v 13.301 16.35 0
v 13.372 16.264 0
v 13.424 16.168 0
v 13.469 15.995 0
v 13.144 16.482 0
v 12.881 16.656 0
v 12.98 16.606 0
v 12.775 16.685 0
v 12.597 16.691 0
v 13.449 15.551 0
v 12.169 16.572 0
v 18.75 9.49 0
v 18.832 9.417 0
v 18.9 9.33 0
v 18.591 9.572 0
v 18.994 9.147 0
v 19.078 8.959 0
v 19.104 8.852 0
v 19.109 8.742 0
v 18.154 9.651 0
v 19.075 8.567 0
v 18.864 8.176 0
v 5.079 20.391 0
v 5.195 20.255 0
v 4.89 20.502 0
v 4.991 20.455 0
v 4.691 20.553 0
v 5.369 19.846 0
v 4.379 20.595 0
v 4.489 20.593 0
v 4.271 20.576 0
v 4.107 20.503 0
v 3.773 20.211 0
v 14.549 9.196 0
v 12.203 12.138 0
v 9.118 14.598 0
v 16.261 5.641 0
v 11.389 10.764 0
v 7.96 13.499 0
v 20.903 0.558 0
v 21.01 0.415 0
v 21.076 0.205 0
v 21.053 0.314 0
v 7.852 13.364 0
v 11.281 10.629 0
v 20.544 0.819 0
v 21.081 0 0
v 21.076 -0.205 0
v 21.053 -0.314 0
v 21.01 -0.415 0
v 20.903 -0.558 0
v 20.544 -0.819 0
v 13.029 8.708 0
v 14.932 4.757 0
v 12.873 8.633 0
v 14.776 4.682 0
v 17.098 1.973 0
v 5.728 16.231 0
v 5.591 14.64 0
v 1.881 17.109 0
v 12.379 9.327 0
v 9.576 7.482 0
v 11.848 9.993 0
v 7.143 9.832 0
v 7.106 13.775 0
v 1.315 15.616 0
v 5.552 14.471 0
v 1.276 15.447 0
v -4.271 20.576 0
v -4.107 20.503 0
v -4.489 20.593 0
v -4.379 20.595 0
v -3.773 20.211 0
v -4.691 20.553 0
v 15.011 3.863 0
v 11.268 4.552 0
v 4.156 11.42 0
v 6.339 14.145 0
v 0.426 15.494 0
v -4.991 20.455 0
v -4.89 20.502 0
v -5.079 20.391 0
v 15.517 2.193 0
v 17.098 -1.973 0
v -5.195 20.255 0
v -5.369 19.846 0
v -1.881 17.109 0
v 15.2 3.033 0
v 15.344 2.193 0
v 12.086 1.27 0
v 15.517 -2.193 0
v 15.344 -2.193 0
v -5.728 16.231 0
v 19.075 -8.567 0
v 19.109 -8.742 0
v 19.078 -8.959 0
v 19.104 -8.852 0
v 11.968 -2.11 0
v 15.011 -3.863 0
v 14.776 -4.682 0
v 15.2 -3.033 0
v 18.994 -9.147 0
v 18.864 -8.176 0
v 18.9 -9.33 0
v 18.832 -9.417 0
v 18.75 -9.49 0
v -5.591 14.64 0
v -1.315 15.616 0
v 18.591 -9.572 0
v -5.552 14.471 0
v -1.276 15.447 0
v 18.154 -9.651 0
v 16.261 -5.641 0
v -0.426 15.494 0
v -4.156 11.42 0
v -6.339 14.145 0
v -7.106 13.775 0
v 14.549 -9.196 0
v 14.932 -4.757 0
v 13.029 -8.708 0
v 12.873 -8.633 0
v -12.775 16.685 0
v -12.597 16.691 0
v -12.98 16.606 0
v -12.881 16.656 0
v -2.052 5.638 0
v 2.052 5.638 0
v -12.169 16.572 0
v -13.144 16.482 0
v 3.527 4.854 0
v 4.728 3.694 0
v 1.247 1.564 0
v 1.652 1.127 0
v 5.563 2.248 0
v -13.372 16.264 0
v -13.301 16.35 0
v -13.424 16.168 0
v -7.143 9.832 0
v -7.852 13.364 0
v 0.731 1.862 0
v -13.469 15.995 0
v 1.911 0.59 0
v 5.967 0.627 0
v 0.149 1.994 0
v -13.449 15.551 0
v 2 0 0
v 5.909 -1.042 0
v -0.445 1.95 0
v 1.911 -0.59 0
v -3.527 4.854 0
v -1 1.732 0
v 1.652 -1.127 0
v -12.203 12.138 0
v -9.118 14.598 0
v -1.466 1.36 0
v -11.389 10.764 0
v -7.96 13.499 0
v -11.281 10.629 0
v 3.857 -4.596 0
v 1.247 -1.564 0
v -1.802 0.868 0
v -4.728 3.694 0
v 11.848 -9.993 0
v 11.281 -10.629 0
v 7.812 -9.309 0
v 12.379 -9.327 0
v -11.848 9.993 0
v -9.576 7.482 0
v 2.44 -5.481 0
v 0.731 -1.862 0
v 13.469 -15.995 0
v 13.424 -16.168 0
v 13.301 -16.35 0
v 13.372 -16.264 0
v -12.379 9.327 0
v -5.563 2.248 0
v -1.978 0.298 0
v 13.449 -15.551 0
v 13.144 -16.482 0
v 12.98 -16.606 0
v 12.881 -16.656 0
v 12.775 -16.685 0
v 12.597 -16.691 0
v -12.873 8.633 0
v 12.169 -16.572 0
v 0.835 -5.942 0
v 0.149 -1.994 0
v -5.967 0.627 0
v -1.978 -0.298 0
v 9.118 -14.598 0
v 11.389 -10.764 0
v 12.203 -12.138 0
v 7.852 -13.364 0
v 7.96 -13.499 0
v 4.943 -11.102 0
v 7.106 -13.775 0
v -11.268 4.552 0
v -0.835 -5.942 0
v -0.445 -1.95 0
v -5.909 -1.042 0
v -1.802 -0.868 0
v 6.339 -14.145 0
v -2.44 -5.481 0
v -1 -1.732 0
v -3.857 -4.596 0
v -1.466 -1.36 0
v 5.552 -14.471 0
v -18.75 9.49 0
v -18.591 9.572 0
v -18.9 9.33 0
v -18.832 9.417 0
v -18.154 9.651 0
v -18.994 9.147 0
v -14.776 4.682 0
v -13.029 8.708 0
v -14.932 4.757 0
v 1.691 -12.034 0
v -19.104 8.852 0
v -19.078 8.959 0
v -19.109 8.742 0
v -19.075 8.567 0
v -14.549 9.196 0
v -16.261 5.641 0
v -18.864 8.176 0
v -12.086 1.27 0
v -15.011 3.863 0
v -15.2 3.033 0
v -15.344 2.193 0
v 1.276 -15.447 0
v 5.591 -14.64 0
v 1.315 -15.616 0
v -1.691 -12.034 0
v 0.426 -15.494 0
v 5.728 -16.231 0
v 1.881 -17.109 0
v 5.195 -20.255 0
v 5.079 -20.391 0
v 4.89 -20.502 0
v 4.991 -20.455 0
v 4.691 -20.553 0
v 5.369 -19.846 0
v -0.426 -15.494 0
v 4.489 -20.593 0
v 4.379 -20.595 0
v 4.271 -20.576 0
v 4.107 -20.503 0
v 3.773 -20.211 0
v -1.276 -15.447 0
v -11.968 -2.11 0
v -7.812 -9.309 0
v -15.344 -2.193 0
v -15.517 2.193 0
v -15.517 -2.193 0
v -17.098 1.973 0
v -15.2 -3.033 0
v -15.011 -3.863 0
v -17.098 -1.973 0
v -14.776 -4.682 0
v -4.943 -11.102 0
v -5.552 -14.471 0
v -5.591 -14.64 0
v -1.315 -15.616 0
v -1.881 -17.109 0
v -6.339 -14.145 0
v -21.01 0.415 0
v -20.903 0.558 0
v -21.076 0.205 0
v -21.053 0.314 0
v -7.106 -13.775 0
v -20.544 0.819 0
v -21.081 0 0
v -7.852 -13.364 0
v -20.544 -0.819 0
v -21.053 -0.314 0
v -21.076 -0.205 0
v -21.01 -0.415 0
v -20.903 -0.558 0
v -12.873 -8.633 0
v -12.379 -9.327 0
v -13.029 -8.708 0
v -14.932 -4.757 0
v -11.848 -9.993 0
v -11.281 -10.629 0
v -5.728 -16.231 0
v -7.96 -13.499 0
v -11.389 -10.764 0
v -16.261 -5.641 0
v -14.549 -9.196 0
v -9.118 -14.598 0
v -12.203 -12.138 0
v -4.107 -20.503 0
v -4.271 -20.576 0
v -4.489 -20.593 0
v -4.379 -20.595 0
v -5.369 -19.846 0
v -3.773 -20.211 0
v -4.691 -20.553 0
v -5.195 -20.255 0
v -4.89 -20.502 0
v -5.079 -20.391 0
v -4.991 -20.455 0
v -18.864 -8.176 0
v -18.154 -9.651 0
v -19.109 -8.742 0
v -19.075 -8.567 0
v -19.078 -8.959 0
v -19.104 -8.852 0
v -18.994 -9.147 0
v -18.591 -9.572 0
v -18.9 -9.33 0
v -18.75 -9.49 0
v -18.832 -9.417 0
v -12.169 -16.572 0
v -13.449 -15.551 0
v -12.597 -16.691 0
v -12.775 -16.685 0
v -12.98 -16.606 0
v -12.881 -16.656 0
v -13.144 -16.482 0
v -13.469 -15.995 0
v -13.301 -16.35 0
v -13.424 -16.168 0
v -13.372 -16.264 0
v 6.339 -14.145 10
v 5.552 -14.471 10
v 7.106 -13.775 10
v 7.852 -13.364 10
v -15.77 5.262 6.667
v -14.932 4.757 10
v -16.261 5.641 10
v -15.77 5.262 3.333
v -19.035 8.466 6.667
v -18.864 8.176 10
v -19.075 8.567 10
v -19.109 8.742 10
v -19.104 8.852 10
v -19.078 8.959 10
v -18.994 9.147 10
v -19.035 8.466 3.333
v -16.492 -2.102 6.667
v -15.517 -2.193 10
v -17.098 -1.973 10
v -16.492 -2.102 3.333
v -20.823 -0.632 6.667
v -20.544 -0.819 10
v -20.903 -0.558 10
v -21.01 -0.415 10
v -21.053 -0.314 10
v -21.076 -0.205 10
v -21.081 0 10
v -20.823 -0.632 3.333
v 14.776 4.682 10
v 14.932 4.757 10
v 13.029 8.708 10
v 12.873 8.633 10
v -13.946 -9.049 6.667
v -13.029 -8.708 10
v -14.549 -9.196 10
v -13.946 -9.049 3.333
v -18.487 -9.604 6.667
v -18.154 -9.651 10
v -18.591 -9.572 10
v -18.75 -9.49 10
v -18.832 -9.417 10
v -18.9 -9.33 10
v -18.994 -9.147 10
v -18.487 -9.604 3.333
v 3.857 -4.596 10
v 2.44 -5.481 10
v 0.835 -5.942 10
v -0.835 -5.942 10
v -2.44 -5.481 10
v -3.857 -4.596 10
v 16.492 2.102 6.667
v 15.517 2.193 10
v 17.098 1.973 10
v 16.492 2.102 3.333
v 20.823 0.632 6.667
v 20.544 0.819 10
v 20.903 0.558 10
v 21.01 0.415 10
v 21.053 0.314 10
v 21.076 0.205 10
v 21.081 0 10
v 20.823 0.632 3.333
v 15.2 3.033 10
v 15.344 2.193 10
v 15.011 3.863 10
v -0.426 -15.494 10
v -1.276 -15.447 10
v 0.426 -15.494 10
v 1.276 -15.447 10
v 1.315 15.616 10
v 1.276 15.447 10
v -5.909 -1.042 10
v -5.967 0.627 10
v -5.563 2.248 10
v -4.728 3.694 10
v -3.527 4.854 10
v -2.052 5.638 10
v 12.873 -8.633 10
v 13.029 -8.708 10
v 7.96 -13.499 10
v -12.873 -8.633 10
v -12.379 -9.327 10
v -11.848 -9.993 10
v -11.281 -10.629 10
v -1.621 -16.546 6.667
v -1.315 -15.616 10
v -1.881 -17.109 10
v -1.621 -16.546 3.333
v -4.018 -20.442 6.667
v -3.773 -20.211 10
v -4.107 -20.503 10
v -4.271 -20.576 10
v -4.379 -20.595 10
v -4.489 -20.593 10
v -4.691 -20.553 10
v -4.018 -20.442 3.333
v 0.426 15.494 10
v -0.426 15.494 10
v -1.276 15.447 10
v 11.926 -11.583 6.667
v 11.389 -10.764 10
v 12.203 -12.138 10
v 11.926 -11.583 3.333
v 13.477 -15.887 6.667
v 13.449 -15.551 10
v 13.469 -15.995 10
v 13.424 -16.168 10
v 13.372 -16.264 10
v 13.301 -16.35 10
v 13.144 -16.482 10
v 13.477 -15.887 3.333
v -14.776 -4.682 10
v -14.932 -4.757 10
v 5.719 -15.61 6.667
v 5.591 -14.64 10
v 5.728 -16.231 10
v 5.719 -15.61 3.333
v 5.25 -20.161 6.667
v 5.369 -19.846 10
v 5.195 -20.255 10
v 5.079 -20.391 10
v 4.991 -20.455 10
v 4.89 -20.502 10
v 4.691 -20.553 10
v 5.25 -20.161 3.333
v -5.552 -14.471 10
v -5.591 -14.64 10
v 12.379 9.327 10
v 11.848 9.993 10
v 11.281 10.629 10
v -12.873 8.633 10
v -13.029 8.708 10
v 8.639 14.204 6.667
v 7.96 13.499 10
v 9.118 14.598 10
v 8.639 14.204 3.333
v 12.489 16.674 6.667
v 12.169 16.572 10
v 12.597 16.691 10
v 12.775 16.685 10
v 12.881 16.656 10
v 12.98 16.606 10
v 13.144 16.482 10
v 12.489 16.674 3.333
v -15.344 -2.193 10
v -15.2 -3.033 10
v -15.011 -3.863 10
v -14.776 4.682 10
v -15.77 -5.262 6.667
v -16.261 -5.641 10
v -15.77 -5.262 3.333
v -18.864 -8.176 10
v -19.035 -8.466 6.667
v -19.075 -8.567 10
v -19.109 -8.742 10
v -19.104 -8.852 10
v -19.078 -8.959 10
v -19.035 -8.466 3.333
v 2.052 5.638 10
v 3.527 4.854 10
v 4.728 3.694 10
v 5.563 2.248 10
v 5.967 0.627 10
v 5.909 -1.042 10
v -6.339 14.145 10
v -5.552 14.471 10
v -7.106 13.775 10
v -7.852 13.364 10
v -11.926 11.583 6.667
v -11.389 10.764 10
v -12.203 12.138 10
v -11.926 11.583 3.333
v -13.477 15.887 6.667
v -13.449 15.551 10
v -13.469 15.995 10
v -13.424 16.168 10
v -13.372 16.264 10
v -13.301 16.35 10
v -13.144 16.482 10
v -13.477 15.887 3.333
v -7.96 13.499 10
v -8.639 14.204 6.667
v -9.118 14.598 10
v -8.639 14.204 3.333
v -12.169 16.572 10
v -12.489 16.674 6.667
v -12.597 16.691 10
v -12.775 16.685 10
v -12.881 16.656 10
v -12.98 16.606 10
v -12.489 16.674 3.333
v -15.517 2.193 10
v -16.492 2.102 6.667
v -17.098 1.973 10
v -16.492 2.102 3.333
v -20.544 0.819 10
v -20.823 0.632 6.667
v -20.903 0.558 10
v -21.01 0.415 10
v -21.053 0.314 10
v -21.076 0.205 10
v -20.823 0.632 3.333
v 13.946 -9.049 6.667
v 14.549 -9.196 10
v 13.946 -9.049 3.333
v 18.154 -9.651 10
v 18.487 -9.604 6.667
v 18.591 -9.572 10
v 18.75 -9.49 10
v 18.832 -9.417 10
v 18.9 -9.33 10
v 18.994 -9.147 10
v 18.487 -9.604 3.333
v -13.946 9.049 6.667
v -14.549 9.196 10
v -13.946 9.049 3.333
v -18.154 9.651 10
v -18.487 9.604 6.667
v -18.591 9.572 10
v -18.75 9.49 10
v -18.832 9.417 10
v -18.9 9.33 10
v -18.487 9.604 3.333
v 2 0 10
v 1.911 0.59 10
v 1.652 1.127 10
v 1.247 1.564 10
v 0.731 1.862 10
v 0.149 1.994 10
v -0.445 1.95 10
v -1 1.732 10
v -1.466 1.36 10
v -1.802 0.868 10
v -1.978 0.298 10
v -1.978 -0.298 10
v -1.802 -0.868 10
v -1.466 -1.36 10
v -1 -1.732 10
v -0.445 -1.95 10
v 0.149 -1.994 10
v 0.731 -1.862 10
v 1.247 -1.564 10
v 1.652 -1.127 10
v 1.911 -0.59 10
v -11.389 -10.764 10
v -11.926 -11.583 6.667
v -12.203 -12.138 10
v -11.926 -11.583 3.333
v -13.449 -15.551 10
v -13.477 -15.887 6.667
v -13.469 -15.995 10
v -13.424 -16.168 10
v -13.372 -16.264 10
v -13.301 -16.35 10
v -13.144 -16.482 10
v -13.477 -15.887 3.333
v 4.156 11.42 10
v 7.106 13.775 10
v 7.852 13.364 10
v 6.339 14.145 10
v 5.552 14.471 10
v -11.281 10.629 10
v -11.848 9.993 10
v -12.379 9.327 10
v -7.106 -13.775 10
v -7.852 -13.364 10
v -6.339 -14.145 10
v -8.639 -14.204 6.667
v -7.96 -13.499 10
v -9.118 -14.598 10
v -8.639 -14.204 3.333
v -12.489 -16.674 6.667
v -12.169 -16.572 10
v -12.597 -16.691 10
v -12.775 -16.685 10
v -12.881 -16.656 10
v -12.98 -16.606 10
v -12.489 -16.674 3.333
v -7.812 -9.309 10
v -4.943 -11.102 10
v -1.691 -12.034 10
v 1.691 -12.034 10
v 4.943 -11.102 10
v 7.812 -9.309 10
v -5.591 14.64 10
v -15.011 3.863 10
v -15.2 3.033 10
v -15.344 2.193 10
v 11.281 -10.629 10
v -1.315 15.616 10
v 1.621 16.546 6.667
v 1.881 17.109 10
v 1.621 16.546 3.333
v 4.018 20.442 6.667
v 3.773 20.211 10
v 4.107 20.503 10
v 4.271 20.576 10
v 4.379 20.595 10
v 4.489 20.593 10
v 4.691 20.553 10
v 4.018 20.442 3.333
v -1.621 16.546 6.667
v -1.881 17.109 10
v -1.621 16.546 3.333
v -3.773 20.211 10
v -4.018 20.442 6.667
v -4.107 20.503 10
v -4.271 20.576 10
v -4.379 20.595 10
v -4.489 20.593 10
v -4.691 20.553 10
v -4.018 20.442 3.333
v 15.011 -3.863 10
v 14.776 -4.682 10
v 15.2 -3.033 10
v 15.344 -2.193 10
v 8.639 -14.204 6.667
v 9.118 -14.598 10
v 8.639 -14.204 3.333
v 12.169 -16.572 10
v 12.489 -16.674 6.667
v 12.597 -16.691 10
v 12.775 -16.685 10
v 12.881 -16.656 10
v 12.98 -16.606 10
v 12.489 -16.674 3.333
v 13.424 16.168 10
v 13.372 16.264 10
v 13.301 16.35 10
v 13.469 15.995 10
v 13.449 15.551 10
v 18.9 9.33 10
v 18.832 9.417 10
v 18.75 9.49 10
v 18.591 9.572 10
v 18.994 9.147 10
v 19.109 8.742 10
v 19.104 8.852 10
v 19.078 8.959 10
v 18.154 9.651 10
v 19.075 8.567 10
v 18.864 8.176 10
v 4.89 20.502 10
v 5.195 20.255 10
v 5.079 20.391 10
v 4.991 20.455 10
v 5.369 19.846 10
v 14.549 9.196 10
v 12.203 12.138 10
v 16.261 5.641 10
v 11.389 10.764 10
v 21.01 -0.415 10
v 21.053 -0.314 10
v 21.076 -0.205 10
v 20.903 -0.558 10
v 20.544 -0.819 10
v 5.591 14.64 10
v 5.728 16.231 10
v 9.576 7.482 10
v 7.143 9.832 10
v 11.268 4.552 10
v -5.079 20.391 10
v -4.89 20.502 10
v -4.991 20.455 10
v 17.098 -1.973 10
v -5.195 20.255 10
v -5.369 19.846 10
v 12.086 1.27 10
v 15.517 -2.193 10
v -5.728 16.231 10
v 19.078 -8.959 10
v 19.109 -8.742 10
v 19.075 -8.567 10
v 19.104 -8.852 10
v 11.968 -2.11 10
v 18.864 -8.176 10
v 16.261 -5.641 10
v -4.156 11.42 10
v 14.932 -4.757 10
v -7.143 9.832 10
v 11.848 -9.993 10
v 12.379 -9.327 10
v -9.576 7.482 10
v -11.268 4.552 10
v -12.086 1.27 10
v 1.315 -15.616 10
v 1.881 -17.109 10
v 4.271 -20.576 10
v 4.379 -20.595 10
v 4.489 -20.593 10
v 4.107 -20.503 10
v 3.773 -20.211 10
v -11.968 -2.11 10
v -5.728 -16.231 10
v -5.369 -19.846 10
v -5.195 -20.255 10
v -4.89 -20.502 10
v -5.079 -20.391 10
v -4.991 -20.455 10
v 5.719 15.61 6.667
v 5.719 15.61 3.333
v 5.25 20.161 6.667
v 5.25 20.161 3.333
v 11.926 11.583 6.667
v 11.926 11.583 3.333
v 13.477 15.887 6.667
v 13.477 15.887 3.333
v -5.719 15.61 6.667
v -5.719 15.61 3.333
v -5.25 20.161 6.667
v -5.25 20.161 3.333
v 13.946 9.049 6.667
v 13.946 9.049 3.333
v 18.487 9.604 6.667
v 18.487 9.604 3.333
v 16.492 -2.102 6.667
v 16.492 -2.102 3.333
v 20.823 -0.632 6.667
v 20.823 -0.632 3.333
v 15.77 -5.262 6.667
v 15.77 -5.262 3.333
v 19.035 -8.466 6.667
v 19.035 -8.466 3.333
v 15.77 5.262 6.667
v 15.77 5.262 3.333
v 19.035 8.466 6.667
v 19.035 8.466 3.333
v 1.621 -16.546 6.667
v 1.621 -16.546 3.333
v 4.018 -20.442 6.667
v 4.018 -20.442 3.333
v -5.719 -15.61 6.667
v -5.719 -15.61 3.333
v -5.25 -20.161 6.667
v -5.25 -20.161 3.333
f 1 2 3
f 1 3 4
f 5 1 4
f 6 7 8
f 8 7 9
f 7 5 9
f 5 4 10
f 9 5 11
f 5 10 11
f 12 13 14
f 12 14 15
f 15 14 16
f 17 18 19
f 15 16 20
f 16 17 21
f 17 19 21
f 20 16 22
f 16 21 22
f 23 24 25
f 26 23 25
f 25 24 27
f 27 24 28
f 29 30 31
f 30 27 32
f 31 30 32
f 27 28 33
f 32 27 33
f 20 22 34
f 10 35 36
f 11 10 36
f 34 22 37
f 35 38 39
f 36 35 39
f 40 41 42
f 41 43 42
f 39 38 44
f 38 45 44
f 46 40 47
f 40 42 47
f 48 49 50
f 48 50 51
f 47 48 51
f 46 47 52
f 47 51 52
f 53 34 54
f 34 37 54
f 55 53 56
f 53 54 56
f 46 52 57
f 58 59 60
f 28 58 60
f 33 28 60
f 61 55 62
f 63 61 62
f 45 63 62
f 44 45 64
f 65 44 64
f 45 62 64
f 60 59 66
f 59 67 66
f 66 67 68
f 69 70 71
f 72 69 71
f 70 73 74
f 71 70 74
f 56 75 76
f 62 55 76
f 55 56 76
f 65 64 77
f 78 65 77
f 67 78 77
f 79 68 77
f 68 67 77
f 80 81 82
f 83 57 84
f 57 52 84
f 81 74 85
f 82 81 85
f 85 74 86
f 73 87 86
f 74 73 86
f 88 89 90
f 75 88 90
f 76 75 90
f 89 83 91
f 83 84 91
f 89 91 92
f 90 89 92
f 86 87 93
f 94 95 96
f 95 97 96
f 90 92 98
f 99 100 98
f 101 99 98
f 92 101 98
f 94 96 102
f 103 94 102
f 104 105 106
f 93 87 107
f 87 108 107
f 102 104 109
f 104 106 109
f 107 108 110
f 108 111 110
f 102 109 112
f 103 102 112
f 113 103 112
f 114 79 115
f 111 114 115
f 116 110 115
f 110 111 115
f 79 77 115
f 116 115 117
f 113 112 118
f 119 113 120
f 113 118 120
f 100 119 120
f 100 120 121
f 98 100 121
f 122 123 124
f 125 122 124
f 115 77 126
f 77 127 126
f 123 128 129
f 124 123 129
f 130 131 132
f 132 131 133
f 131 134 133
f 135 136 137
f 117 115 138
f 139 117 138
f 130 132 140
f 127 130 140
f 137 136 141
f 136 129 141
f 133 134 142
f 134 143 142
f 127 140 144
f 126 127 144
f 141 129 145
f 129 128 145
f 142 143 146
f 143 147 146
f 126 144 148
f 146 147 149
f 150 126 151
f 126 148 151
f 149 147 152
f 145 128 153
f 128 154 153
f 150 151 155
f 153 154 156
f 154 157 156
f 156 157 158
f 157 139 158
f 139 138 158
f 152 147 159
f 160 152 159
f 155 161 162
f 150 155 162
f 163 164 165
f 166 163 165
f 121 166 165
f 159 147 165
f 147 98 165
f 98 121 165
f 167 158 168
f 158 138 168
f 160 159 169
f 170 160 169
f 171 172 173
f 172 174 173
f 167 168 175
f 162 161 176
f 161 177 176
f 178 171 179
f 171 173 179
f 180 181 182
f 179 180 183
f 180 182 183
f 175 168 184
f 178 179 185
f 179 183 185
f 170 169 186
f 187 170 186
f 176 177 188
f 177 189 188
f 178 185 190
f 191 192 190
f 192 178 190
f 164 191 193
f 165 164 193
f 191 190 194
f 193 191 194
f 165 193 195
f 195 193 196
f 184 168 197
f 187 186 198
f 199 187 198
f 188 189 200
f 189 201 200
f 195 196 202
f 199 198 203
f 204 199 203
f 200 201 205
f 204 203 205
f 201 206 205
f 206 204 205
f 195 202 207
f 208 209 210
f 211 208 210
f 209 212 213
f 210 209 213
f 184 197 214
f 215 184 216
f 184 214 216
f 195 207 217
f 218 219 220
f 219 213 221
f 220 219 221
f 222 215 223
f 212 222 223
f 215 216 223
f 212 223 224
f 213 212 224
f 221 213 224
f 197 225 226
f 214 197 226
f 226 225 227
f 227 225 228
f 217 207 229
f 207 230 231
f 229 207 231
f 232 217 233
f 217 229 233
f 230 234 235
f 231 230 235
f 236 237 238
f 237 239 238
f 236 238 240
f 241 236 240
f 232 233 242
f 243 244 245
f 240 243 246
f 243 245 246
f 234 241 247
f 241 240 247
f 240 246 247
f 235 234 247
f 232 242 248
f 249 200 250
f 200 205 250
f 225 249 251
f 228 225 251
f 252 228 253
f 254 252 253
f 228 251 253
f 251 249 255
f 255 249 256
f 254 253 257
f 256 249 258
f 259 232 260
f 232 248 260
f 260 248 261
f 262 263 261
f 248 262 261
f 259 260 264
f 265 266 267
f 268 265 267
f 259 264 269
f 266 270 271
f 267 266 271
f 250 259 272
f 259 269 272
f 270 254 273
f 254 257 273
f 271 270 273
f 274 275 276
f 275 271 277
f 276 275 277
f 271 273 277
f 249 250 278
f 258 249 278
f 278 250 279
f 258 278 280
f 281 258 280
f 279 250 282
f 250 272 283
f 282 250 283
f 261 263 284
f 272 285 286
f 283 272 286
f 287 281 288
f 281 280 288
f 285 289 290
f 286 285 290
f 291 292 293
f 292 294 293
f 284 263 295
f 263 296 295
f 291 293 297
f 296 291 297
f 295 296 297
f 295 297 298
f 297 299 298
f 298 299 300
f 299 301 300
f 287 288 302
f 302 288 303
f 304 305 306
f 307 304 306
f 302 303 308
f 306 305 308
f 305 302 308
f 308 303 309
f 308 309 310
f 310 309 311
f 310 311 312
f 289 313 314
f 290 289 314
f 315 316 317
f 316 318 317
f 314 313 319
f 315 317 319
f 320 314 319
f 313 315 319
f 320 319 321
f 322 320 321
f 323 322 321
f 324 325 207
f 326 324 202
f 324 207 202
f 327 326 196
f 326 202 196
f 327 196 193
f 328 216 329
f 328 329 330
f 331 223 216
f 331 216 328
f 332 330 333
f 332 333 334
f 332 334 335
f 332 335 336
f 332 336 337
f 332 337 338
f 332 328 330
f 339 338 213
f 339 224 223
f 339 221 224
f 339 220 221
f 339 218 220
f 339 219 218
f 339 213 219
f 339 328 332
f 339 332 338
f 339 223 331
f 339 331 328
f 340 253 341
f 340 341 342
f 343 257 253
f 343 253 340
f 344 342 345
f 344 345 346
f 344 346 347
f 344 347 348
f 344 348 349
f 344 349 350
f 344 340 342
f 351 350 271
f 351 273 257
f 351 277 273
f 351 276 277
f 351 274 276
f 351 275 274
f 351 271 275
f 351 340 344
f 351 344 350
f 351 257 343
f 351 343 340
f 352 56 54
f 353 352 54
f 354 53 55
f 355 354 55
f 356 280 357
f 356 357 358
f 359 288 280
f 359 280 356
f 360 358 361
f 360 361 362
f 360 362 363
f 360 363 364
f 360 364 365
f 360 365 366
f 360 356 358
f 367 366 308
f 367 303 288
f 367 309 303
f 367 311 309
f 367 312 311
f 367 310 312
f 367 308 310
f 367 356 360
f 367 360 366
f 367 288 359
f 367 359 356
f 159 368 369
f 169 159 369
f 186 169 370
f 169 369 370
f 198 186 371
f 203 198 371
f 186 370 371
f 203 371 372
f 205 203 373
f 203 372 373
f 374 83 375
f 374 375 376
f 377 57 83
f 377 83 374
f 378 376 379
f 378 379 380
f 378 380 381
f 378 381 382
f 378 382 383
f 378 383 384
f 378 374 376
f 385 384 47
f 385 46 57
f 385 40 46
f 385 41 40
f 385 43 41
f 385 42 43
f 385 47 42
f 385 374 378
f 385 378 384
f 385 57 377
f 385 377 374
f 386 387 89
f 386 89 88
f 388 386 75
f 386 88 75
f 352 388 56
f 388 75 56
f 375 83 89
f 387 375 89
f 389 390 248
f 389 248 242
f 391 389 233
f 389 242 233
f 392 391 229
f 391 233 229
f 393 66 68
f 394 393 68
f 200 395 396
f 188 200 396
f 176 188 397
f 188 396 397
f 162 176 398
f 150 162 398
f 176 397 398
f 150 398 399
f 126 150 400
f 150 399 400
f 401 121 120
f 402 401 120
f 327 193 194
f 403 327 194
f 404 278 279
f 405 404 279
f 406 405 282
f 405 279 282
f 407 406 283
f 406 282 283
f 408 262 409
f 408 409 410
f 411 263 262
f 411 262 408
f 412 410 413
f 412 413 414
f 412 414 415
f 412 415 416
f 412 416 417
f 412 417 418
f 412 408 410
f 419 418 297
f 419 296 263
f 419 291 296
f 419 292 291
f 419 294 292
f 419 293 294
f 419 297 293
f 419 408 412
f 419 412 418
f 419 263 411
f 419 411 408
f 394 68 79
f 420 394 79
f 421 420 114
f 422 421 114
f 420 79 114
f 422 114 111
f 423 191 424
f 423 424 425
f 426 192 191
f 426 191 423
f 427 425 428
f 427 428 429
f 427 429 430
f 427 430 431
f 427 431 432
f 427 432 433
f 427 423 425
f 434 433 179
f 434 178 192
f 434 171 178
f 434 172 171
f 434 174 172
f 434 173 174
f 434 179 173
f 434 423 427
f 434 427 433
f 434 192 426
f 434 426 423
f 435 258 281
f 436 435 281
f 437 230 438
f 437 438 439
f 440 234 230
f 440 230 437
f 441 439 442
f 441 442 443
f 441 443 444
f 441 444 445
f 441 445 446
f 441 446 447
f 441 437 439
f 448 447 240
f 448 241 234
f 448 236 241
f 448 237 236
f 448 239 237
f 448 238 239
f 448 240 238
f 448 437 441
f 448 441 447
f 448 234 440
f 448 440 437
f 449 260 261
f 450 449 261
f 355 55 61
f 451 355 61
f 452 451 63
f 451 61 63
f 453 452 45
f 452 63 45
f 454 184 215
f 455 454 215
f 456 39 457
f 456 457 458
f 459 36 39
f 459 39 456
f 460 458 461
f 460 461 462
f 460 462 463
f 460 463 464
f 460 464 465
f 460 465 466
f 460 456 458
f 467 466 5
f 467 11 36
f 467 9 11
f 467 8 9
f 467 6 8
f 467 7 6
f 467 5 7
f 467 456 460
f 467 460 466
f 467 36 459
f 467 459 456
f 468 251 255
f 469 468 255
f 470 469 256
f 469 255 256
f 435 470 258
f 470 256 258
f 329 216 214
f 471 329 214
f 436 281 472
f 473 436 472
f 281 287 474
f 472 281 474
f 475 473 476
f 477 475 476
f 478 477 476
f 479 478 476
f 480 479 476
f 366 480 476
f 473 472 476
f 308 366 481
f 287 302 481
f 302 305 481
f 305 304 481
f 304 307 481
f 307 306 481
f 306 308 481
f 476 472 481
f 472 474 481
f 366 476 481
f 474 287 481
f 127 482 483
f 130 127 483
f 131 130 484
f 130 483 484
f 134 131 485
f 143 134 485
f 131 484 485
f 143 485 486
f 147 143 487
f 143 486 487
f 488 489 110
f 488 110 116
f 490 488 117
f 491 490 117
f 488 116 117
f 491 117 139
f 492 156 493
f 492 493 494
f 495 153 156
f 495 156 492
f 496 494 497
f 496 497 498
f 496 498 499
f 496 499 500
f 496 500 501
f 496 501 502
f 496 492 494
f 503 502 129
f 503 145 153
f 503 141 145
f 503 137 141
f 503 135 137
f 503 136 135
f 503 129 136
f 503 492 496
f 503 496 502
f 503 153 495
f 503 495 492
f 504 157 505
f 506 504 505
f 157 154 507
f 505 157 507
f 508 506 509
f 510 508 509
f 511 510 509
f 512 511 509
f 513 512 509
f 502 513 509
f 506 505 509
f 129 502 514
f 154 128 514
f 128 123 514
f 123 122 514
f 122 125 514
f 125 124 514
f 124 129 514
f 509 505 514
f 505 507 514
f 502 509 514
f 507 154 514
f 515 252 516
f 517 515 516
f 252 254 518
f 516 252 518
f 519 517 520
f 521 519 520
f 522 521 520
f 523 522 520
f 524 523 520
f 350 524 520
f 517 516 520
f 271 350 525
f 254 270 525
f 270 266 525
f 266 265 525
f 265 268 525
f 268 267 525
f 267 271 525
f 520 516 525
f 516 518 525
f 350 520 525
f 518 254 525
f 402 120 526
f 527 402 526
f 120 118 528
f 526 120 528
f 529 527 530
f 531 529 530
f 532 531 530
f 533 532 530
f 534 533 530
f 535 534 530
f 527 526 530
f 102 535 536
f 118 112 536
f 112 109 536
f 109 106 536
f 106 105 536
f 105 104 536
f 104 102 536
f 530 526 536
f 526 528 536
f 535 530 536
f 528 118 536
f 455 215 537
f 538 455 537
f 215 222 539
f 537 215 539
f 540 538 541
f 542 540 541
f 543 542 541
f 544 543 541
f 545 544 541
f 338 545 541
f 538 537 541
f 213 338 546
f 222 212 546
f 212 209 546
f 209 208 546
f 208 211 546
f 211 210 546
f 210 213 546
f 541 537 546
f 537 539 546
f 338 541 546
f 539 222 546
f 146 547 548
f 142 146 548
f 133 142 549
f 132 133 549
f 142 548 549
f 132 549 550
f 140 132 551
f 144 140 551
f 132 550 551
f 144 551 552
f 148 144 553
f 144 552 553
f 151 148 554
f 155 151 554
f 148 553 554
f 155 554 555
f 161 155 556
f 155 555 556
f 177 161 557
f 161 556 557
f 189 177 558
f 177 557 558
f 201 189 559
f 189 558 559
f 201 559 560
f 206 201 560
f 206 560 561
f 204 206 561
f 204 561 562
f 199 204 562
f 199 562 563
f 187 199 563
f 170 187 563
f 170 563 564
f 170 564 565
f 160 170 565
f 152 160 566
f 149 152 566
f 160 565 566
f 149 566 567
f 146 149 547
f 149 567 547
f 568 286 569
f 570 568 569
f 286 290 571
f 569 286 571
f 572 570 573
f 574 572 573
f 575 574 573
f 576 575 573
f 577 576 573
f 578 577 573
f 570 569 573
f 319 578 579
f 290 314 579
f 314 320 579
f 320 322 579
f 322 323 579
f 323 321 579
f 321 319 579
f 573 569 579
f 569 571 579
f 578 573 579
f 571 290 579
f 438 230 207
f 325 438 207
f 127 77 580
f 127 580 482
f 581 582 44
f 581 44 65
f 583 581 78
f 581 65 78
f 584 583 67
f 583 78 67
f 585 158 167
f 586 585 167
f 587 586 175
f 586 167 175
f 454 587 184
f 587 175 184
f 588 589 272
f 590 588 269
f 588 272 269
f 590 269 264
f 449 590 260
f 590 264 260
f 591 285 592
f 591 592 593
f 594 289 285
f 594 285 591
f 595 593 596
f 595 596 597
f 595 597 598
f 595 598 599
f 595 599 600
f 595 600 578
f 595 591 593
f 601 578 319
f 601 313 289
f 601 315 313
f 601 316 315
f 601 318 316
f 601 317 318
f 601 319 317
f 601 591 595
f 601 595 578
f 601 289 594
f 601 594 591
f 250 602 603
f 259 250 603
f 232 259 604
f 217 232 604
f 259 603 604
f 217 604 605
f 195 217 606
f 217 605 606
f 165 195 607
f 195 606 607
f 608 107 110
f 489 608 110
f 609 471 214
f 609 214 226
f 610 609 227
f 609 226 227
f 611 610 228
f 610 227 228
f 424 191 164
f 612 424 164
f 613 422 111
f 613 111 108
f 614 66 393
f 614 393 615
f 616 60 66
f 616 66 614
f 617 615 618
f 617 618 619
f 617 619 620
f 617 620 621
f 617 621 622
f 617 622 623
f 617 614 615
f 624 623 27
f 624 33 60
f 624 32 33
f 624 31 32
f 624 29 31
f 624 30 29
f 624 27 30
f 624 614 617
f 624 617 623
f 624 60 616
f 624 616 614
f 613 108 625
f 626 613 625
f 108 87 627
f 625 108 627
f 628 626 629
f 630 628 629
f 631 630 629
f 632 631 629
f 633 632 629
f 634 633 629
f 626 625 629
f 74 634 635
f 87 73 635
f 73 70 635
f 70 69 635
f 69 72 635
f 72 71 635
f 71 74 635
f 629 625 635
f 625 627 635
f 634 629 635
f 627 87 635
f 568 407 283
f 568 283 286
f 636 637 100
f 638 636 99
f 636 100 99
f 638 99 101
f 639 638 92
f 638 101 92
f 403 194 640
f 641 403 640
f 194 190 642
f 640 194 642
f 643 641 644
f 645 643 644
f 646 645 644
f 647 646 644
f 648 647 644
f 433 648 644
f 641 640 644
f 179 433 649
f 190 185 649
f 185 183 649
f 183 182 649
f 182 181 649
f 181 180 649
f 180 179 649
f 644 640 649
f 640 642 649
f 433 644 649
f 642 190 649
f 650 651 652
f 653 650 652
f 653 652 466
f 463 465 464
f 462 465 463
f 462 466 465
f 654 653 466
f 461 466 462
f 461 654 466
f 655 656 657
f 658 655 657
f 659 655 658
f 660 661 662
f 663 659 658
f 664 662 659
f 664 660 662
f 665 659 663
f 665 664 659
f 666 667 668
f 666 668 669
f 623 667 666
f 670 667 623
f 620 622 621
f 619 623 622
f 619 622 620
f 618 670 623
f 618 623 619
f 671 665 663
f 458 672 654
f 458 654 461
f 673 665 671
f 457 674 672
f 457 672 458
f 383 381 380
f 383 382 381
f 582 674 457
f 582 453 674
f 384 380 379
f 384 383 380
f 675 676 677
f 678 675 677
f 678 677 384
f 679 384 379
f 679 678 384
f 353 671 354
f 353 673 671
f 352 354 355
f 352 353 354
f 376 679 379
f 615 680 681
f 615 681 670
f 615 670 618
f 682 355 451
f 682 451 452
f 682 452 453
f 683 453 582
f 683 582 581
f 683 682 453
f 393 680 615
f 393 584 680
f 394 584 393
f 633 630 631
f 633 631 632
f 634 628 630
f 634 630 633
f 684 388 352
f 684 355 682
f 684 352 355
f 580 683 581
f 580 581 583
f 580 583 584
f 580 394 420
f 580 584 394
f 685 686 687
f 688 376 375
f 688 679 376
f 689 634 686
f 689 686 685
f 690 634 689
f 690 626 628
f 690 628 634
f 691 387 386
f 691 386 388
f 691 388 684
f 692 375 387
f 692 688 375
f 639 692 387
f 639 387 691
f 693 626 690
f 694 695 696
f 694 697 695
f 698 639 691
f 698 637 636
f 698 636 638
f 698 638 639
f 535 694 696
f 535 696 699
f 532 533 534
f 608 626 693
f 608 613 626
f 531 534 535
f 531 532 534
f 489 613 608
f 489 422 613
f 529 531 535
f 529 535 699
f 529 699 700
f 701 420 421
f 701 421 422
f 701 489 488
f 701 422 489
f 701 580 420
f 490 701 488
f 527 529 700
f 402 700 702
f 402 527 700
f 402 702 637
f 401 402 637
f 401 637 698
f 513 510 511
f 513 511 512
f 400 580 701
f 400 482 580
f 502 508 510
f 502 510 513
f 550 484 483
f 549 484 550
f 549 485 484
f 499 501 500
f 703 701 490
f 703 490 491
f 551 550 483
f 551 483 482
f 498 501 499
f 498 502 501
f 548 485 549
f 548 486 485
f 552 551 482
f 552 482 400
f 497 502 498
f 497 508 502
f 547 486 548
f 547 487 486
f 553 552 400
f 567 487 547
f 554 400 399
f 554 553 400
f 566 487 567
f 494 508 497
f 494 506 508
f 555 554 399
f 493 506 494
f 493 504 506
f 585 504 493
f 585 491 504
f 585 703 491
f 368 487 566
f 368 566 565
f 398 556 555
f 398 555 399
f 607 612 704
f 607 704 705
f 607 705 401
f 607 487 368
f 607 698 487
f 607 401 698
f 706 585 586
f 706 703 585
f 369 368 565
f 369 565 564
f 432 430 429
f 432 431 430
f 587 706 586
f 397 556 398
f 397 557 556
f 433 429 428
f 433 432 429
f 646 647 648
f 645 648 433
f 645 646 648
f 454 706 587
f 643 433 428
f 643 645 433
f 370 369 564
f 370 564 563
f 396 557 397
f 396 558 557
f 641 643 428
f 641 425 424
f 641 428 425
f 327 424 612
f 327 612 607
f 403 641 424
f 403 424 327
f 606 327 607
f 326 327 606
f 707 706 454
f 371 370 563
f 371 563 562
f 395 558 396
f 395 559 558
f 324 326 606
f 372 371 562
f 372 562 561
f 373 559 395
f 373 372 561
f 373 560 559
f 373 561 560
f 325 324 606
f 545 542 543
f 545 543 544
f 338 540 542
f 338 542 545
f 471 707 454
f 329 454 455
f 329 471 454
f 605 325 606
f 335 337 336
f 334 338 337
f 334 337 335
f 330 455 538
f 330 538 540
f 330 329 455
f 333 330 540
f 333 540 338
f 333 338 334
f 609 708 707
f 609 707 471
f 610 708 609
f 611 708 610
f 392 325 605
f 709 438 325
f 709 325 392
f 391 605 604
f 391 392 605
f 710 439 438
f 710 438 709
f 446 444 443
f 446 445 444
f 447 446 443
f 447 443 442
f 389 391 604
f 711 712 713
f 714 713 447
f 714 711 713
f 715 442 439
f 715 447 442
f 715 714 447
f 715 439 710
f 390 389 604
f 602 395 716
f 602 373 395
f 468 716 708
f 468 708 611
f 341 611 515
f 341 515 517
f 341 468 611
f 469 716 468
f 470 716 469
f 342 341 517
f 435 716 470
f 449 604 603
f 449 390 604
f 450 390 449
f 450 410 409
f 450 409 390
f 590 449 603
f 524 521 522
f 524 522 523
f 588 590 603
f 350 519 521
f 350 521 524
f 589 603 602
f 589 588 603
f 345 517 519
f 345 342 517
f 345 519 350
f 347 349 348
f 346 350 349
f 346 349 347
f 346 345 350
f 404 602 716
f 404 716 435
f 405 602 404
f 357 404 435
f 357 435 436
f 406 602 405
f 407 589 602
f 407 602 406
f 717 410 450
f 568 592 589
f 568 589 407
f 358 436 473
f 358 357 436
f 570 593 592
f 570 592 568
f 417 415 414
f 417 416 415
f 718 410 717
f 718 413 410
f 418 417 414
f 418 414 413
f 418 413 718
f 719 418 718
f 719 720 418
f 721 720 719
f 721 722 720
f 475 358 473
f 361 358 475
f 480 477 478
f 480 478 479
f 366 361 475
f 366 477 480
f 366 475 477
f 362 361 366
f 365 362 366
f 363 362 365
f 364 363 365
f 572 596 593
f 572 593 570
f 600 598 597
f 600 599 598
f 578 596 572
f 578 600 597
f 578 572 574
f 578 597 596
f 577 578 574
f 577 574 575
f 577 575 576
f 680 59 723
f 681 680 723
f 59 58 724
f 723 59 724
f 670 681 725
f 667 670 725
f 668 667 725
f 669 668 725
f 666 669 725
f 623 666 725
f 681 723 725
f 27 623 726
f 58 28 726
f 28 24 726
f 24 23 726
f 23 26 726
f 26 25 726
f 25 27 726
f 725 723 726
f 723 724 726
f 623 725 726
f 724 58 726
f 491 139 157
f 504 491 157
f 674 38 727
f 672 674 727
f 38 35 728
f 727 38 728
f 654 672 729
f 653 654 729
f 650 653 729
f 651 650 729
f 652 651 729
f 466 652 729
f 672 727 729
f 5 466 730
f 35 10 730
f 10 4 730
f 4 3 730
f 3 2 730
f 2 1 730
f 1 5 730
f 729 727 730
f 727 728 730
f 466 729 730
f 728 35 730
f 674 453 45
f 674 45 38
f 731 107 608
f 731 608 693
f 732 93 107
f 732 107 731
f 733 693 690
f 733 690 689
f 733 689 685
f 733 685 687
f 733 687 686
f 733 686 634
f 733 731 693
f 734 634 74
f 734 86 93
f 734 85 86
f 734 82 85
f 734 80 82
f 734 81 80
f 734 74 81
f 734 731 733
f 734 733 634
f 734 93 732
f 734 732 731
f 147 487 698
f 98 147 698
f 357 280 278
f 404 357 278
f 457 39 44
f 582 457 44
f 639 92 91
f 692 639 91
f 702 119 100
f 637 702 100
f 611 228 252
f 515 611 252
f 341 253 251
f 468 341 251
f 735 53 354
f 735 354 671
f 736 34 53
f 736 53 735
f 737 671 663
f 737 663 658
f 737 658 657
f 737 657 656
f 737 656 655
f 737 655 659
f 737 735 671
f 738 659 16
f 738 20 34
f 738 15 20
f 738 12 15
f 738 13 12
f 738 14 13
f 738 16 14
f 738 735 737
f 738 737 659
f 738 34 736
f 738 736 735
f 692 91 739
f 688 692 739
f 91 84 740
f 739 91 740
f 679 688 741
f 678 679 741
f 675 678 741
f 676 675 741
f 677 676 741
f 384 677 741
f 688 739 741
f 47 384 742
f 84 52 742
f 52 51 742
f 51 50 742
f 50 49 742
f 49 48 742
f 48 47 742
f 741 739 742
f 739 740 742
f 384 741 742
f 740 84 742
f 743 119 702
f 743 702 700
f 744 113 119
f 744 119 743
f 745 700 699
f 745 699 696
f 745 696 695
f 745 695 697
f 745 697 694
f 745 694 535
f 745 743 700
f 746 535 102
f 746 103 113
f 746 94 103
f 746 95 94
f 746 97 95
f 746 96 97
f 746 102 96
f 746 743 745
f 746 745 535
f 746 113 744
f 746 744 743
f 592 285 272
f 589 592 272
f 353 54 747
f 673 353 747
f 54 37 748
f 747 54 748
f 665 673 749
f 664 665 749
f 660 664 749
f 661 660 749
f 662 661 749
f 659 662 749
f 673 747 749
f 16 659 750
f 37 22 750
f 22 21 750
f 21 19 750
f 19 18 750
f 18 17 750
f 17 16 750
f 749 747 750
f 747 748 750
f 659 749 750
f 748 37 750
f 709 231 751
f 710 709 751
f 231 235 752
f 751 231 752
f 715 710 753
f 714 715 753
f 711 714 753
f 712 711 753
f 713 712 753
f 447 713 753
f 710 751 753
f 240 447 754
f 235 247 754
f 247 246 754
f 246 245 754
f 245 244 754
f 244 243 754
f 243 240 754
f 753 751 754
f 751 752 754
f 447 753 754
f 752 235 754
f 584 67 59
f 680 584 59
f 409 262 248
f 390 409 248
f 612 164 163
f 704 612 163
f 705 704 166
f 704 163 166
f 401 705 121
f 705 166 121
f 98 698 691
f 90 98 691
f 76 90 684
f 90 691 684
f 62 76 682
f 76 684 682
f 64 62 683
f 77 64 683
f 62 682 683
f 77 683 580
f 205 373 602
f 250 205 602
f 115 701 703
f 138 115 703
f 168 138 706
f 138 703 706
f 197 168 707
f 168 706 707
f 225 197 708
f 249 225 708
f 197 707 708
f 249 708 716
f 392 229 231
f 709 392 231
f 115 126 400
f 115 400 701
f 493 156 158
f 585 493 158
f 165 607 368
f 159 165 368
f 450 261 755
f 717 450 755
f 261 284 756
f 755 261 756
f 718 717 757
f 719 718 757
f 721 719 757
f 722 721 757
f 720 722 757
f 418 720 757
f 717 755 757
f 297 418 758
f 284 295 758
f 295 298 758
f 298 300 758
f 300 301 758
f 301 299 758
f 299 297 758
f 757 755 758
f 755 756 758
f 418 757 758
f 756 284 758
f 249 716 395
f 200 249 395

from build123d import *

# Parameters (mm, degrees)
F0_R     = 5.3351790251
F1_DEPTH = 10
F2_DEPTH = 10
F3_COUNT = 14
F4_R     = 15.5
F5_DEPTH = 10
F8_DEPTH = 10
F7_R     = 2
F9_DEPTH = 10


# Not quite as in the source:
# - a feature names something its author has since deleted; it is built from what else it names


with BuildPart() as f1:
    # F0 (on Top) → F1 (new body)
    with BuildSketch(Plane.XY):
        Circle(F0_R)
    extrude(amount=F1_DEPTH)



with BuildPart() as f2:
    # F0 (on Top) → F2 (new body)
    with BuildSketch(Plane.XY):
        with BuildLine():
            Line((-21.0813645951, 0), (-15.5169374102, 0))
            Line((-15.5169374102, 0), (-15.5169374102, 2.1929510403))
            add(Edge.make_bspline(
                [(-15.5169374102, 2.1929510403), (-15.7431787684, 2.1963284468), (-16.4584927159, 2.2070069607), (-21.1021855068, 0.9410331304), (-21.0859014535, 0.2050513008), (-21.0813645951, 0)],
                knots=[0, 0, 0, 0, 0.2502118821, 0.7911020914, 1, 1, 1, 1], degree=3))
        make_face()
        Polygon((-15.5169374102, -2.1929510403), (-13.8607590251, -2.1929510403), (-13.8607590251, 2.1929510403), (-15.5169374102, 2.1929510403), (-15.5169374102, 0), align=None)
        with BuildLine():
            add(Edge.make_bspline(
                [(-15.5169374102, -2.1929510403), (-15.7431787684, -2.1963284468), (-16.4584927159, -2.2070069607), (-21.1021855068, -0.9410331304), (-21.0859014535, -0.2050513008), (-21.0813645951, 0)],
                knots=[0, 0, 0, 0, 0.2502118821, 0.7911020914, 1, 1, 1, 1], degree=3))
            Line((-15.5169374102, -2.1929510403), (-15.5169374102, 0))
            Line((-15.5169374102, 0), (-21.0813645951, 0))
        make_face()
    extrude(amount=F2_DEPTH)


with BuildPart() as f3_1:
    # F3: instance of F2
    add(f2.part.rotate(Axis((0, 0, 10), (0, 0, 1)), 1 * 360 / F3_COUNT))


with BuildPart() as f3_2:
    # F3: instance of F2
    add(f2.part.rotate(Axis((0, 0, 10), (0, 0, 1)), 2 * 360 / F3_COUNT))


with BuildPart() as f3_3:
    # F3: instance of F2
    add(f2.part.rotate(Axis((0, 0, 10), (0, 0, 1)), 3 * 360 / F3_COUNT))


with BuildPart() as f3_4:
    # F3: instance of F2
    add(f2.part.rotate(Axis((0, 0, 10), (0, 0, 1)), 4 * 360 / F3_COUNT))


with BuildPart() as f3_5:
    # F3: instance of F2
    add(f2.part.rotate(Axis((0, 0, 10), (0, 0, 1)), 5 * 360 / F3_COUNT))


with BuildPart() as f3_6:
    # F3: instance of F2
    add(f2.part.rotate(Axis((0, 0, 10), (0, 0, 1)), 6 * 360 / F3_COUNT))


with BuildPart() as f3_7:
    # F3: instance of F2
    add(f2.part.rotate(Axis((0, 0, 10), (0, 0, 1)), 7 * 360 / F3_COUNT))


with BuildPart() as f3_8:
    # F3: instance of F2
    add(f2.part.rotate(Axis((0, 0, 10), (0, 0, 1)), 8 * 360 / F3_COUNT))


with BuildPart() as f3_9:
    # F3: instance of F2
    add(f2.part.rotate(Axis((0, 0, 10), (0, 0, 1)), 9 * 360 / F3_COUNT))


with BuildPart() as f3_10:
    # F3: instance of F2
    add(f2.part.rotate(Axis((0, 0, 10), (0, 0, 1)), 10 * 360 / F3_COUNT))


with BuildPart() as f3_11:
    # F3: instance of F2
    add(f2.part.rotate(Axis((0, 0, 10), (0, 0, 1)), 11 * 360 / F3_COUNT))


with BuildPart() as f3_12:
    # F3: instance of F2
    add(f2.part.rotate(Axis((0, 0, 10), (0, 0, 1)), 12 * 360 / F3_COUNT))


with BuildPart() as f3_13:
    # F3: instance of F2
    add(f2.part.rotate(Axis((0, 0, 10), (0, 0, 1)), 13 * 360 / F3_COUNT))


with BuildPart() as f1_1:
    add(f1.part)

    add(f2.part)  # F5 merges F2

    add(f3_1.part)  # F5 merges F3_1

    add(f3_2.part)  # F5 merges F3_2

    add(f3_3.part)  # F5 merges F3_3

    add(f3_4.part)  # F5 merges F3_4

    add(f3_5.part)  # F5 merges F3_5

    add(f3_6.part)  # F5 merges F3_6

    add(f3_7.part)  # F5 merges F3_7

    add(f3_8.part)  # F5 merges F3_8

    add(f3_9.part)  # F5 merges F3_9

    add(f3_10.part)  # F5 merges F3_10

    add(f3_11.part)  # F5 merges F3_11

    add(f3_12.part)  # F5 merges F3_12

    add(f3_13.part)  # F5 merges F3_13
    # F4 (on Top) → F5 (join)
    with BuildSketch(Plane.XY):
        Circle(F4_R)
    extrude(amount=F5_DEPTH)

    # F6 (on face) → F8 (cut, through all)
    with BuildSketch(Plane.XY.offset(10)):
        with BuildLine():
            ThreePointArc((-5.9088465181, -1.041889066), (-5.1961524227, 3), (-2.05212086, 5.6381557247))
            Line((-2.05212086, 5.6381557247), (-4.1564424219, 11.4197316993))
            ThreePointArc((-4.1564424219, 11.4197316993), (-10.5244816627, 6.076312321), (-11.967998967, -2.110281123))
            Line((-11.967998967, -2.110281123), (-5.9088465181, -1.041889066))
        make_face()
        with BuildLine():
            Line((-3.8567256581, -4.5962666587), (-7.8115565451, -9.3094505764))
            ThreePointArc((-7.8115565451, -9.3094505764), (0, -12.1526246421), (7.8115565451, -9.3094505764))
            Line((7.8115565451, -9.3094505764), (3.8567256581, -4.5962666587))
            ThreePointArc((3.8567256581, -4.5962666587), (0, -6), (-3.8567256581, -4.5962666587))
        make_face()
        with BuildLine():
            ThreePointArc((2.05212086, 5.6381557247), (5.1961524227, 3), (5.9088465181, -1.041889066))
            Line((5.9088465181, -1.041889066), (11.967998967, -2.110281123))
            ThreePointArc((11.967998967, -2.110281123), (10.5244816627, 6.076312321), (4.1564424219, 11.4197316993))
            Line((4.1564424219, 11.4197316993), (2.05212086, 5.6381557247))
        make_face()
    extrude(amount=-F8_DEPTH, mode=Mode.SUBTRACT)

    # F7 (on face) → F9 (cut, through all)
    with BuildSketch(Plane.XY.offset(10)):
        Circle(F7_R)
    extrude(amount=-F9_DEPTH, mode=Mode.SUBTRACT)


solid = f1_1.part
